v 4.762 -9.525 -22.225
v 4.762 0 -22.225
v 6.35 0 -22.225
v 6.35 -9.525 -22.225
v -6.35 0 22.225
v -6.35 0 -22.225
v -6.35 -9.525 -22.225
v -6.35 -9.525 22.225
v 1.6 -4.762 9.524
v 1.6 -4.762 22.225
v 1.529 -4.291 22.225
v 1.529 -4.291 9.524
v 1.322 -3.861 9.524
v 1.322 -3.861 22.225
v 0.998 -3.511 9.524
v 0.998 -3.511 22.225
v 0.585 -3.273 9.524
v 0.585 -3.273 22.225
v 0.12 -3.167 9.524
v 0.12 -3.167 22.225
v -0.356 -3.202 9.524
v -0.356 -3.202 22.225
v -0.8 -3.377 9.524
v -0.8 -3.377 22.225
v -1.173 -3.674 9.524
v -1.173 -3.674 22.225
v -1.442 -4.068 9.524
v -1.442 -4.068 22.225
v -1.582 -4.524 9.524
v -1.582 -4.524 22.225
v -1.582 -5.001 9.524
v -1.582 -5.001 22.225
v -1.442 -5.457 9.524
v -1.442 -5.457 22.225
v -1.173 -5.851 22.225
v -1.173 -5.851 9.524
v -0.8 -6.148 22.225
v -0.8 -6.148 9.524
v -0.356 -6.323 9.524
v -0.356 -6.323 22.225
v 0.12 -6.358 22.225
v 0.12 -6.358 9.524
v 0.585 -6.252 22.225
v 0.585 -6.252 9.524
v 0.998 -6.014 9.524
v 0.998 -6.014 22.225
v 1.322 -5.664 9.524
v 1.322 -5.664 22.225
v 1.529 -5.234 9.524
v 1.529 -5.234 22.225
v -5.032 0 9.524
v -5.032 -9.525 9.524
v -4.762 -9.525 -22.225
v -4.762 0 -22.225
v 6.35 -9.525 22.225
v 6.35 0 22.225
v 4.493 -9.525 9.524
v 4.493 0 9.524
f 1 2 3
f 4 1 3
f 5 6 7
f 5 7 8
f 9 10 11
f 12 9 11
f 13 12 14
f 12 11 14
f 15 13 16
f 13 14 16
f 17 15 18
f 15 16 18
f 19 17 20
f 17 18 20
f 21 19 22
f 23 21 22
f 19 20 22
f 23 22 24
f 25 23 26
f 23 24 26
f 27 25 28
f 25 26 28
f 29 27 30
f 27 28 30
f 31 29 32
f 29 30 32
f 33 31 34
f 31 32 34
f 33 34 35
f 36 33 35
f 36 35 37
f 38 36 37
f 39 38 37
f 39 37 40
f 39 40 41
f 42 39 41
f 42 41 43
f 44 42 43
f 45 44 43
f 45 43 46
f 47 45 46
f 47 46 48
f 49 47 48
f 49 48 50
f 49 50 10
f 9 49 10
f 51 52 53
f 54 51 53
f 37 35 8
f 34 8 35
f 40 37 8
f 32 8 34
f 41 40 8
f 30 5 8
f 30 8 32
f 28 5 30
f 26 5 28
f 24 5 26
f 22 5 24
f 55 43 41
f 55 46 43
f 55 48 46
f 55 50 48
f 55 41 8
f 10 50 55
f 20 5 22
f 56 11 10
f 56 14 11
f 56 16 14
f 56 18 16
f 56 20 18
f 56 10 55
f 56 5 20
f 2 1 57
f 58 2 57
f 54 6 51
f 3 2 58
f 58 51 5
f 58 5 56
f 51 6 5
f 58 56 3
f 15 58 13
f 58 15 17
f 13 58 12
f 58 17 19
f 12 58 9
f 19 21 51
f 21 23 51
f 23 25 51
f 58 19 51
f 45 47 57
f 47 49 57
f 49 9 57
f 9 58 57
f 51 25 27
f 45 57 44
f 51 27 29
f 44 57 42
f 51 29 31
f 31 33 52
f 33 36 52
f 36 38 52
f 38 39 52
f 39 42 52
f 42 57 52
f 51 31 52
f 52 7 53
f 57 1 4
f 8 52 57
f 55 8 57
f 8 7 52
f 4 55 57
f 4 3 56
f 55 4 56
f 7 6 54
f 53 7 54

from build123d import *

# Parameters (mm, degrees)
F0_W     = 12.7
F0_H     = 44.45
F1_DEPTH = 9.525
F2_R     = 1.6002
F3_DEPTH = 25.4
F5_DEPTH = 25.4


with BuildPart() as f1:
    # F0 (on Front) → F1 (new body)
    with BuildSketch(Plane.XZ):
        Rectangle(F0_W, F0_H)
    extrude(amount=F1_DEPTH)

    # F2 (on face) → F3 (cut)
    with BuildSketch(Plane.XY.offset(22.225)):
        with Locations((0, -4.7625)):
            Circle(F2_R)
    extrude(amount=-F3_DEPTH, mode=Mode.SUBTRACT)

    # F4 (on face) → F5 (cut)
    with BuildSketch(Plane.XZ.offset(9.525)):
        Polygon((4.7625, -22.225), (4.493098, 9.523857), (-5.031902, 9.523857), (-4.7625, -22.225), align=None)
    extrude(amount=-F5_DEPTH, mode=Mode.SUBTRACT)


solid = f1.part
